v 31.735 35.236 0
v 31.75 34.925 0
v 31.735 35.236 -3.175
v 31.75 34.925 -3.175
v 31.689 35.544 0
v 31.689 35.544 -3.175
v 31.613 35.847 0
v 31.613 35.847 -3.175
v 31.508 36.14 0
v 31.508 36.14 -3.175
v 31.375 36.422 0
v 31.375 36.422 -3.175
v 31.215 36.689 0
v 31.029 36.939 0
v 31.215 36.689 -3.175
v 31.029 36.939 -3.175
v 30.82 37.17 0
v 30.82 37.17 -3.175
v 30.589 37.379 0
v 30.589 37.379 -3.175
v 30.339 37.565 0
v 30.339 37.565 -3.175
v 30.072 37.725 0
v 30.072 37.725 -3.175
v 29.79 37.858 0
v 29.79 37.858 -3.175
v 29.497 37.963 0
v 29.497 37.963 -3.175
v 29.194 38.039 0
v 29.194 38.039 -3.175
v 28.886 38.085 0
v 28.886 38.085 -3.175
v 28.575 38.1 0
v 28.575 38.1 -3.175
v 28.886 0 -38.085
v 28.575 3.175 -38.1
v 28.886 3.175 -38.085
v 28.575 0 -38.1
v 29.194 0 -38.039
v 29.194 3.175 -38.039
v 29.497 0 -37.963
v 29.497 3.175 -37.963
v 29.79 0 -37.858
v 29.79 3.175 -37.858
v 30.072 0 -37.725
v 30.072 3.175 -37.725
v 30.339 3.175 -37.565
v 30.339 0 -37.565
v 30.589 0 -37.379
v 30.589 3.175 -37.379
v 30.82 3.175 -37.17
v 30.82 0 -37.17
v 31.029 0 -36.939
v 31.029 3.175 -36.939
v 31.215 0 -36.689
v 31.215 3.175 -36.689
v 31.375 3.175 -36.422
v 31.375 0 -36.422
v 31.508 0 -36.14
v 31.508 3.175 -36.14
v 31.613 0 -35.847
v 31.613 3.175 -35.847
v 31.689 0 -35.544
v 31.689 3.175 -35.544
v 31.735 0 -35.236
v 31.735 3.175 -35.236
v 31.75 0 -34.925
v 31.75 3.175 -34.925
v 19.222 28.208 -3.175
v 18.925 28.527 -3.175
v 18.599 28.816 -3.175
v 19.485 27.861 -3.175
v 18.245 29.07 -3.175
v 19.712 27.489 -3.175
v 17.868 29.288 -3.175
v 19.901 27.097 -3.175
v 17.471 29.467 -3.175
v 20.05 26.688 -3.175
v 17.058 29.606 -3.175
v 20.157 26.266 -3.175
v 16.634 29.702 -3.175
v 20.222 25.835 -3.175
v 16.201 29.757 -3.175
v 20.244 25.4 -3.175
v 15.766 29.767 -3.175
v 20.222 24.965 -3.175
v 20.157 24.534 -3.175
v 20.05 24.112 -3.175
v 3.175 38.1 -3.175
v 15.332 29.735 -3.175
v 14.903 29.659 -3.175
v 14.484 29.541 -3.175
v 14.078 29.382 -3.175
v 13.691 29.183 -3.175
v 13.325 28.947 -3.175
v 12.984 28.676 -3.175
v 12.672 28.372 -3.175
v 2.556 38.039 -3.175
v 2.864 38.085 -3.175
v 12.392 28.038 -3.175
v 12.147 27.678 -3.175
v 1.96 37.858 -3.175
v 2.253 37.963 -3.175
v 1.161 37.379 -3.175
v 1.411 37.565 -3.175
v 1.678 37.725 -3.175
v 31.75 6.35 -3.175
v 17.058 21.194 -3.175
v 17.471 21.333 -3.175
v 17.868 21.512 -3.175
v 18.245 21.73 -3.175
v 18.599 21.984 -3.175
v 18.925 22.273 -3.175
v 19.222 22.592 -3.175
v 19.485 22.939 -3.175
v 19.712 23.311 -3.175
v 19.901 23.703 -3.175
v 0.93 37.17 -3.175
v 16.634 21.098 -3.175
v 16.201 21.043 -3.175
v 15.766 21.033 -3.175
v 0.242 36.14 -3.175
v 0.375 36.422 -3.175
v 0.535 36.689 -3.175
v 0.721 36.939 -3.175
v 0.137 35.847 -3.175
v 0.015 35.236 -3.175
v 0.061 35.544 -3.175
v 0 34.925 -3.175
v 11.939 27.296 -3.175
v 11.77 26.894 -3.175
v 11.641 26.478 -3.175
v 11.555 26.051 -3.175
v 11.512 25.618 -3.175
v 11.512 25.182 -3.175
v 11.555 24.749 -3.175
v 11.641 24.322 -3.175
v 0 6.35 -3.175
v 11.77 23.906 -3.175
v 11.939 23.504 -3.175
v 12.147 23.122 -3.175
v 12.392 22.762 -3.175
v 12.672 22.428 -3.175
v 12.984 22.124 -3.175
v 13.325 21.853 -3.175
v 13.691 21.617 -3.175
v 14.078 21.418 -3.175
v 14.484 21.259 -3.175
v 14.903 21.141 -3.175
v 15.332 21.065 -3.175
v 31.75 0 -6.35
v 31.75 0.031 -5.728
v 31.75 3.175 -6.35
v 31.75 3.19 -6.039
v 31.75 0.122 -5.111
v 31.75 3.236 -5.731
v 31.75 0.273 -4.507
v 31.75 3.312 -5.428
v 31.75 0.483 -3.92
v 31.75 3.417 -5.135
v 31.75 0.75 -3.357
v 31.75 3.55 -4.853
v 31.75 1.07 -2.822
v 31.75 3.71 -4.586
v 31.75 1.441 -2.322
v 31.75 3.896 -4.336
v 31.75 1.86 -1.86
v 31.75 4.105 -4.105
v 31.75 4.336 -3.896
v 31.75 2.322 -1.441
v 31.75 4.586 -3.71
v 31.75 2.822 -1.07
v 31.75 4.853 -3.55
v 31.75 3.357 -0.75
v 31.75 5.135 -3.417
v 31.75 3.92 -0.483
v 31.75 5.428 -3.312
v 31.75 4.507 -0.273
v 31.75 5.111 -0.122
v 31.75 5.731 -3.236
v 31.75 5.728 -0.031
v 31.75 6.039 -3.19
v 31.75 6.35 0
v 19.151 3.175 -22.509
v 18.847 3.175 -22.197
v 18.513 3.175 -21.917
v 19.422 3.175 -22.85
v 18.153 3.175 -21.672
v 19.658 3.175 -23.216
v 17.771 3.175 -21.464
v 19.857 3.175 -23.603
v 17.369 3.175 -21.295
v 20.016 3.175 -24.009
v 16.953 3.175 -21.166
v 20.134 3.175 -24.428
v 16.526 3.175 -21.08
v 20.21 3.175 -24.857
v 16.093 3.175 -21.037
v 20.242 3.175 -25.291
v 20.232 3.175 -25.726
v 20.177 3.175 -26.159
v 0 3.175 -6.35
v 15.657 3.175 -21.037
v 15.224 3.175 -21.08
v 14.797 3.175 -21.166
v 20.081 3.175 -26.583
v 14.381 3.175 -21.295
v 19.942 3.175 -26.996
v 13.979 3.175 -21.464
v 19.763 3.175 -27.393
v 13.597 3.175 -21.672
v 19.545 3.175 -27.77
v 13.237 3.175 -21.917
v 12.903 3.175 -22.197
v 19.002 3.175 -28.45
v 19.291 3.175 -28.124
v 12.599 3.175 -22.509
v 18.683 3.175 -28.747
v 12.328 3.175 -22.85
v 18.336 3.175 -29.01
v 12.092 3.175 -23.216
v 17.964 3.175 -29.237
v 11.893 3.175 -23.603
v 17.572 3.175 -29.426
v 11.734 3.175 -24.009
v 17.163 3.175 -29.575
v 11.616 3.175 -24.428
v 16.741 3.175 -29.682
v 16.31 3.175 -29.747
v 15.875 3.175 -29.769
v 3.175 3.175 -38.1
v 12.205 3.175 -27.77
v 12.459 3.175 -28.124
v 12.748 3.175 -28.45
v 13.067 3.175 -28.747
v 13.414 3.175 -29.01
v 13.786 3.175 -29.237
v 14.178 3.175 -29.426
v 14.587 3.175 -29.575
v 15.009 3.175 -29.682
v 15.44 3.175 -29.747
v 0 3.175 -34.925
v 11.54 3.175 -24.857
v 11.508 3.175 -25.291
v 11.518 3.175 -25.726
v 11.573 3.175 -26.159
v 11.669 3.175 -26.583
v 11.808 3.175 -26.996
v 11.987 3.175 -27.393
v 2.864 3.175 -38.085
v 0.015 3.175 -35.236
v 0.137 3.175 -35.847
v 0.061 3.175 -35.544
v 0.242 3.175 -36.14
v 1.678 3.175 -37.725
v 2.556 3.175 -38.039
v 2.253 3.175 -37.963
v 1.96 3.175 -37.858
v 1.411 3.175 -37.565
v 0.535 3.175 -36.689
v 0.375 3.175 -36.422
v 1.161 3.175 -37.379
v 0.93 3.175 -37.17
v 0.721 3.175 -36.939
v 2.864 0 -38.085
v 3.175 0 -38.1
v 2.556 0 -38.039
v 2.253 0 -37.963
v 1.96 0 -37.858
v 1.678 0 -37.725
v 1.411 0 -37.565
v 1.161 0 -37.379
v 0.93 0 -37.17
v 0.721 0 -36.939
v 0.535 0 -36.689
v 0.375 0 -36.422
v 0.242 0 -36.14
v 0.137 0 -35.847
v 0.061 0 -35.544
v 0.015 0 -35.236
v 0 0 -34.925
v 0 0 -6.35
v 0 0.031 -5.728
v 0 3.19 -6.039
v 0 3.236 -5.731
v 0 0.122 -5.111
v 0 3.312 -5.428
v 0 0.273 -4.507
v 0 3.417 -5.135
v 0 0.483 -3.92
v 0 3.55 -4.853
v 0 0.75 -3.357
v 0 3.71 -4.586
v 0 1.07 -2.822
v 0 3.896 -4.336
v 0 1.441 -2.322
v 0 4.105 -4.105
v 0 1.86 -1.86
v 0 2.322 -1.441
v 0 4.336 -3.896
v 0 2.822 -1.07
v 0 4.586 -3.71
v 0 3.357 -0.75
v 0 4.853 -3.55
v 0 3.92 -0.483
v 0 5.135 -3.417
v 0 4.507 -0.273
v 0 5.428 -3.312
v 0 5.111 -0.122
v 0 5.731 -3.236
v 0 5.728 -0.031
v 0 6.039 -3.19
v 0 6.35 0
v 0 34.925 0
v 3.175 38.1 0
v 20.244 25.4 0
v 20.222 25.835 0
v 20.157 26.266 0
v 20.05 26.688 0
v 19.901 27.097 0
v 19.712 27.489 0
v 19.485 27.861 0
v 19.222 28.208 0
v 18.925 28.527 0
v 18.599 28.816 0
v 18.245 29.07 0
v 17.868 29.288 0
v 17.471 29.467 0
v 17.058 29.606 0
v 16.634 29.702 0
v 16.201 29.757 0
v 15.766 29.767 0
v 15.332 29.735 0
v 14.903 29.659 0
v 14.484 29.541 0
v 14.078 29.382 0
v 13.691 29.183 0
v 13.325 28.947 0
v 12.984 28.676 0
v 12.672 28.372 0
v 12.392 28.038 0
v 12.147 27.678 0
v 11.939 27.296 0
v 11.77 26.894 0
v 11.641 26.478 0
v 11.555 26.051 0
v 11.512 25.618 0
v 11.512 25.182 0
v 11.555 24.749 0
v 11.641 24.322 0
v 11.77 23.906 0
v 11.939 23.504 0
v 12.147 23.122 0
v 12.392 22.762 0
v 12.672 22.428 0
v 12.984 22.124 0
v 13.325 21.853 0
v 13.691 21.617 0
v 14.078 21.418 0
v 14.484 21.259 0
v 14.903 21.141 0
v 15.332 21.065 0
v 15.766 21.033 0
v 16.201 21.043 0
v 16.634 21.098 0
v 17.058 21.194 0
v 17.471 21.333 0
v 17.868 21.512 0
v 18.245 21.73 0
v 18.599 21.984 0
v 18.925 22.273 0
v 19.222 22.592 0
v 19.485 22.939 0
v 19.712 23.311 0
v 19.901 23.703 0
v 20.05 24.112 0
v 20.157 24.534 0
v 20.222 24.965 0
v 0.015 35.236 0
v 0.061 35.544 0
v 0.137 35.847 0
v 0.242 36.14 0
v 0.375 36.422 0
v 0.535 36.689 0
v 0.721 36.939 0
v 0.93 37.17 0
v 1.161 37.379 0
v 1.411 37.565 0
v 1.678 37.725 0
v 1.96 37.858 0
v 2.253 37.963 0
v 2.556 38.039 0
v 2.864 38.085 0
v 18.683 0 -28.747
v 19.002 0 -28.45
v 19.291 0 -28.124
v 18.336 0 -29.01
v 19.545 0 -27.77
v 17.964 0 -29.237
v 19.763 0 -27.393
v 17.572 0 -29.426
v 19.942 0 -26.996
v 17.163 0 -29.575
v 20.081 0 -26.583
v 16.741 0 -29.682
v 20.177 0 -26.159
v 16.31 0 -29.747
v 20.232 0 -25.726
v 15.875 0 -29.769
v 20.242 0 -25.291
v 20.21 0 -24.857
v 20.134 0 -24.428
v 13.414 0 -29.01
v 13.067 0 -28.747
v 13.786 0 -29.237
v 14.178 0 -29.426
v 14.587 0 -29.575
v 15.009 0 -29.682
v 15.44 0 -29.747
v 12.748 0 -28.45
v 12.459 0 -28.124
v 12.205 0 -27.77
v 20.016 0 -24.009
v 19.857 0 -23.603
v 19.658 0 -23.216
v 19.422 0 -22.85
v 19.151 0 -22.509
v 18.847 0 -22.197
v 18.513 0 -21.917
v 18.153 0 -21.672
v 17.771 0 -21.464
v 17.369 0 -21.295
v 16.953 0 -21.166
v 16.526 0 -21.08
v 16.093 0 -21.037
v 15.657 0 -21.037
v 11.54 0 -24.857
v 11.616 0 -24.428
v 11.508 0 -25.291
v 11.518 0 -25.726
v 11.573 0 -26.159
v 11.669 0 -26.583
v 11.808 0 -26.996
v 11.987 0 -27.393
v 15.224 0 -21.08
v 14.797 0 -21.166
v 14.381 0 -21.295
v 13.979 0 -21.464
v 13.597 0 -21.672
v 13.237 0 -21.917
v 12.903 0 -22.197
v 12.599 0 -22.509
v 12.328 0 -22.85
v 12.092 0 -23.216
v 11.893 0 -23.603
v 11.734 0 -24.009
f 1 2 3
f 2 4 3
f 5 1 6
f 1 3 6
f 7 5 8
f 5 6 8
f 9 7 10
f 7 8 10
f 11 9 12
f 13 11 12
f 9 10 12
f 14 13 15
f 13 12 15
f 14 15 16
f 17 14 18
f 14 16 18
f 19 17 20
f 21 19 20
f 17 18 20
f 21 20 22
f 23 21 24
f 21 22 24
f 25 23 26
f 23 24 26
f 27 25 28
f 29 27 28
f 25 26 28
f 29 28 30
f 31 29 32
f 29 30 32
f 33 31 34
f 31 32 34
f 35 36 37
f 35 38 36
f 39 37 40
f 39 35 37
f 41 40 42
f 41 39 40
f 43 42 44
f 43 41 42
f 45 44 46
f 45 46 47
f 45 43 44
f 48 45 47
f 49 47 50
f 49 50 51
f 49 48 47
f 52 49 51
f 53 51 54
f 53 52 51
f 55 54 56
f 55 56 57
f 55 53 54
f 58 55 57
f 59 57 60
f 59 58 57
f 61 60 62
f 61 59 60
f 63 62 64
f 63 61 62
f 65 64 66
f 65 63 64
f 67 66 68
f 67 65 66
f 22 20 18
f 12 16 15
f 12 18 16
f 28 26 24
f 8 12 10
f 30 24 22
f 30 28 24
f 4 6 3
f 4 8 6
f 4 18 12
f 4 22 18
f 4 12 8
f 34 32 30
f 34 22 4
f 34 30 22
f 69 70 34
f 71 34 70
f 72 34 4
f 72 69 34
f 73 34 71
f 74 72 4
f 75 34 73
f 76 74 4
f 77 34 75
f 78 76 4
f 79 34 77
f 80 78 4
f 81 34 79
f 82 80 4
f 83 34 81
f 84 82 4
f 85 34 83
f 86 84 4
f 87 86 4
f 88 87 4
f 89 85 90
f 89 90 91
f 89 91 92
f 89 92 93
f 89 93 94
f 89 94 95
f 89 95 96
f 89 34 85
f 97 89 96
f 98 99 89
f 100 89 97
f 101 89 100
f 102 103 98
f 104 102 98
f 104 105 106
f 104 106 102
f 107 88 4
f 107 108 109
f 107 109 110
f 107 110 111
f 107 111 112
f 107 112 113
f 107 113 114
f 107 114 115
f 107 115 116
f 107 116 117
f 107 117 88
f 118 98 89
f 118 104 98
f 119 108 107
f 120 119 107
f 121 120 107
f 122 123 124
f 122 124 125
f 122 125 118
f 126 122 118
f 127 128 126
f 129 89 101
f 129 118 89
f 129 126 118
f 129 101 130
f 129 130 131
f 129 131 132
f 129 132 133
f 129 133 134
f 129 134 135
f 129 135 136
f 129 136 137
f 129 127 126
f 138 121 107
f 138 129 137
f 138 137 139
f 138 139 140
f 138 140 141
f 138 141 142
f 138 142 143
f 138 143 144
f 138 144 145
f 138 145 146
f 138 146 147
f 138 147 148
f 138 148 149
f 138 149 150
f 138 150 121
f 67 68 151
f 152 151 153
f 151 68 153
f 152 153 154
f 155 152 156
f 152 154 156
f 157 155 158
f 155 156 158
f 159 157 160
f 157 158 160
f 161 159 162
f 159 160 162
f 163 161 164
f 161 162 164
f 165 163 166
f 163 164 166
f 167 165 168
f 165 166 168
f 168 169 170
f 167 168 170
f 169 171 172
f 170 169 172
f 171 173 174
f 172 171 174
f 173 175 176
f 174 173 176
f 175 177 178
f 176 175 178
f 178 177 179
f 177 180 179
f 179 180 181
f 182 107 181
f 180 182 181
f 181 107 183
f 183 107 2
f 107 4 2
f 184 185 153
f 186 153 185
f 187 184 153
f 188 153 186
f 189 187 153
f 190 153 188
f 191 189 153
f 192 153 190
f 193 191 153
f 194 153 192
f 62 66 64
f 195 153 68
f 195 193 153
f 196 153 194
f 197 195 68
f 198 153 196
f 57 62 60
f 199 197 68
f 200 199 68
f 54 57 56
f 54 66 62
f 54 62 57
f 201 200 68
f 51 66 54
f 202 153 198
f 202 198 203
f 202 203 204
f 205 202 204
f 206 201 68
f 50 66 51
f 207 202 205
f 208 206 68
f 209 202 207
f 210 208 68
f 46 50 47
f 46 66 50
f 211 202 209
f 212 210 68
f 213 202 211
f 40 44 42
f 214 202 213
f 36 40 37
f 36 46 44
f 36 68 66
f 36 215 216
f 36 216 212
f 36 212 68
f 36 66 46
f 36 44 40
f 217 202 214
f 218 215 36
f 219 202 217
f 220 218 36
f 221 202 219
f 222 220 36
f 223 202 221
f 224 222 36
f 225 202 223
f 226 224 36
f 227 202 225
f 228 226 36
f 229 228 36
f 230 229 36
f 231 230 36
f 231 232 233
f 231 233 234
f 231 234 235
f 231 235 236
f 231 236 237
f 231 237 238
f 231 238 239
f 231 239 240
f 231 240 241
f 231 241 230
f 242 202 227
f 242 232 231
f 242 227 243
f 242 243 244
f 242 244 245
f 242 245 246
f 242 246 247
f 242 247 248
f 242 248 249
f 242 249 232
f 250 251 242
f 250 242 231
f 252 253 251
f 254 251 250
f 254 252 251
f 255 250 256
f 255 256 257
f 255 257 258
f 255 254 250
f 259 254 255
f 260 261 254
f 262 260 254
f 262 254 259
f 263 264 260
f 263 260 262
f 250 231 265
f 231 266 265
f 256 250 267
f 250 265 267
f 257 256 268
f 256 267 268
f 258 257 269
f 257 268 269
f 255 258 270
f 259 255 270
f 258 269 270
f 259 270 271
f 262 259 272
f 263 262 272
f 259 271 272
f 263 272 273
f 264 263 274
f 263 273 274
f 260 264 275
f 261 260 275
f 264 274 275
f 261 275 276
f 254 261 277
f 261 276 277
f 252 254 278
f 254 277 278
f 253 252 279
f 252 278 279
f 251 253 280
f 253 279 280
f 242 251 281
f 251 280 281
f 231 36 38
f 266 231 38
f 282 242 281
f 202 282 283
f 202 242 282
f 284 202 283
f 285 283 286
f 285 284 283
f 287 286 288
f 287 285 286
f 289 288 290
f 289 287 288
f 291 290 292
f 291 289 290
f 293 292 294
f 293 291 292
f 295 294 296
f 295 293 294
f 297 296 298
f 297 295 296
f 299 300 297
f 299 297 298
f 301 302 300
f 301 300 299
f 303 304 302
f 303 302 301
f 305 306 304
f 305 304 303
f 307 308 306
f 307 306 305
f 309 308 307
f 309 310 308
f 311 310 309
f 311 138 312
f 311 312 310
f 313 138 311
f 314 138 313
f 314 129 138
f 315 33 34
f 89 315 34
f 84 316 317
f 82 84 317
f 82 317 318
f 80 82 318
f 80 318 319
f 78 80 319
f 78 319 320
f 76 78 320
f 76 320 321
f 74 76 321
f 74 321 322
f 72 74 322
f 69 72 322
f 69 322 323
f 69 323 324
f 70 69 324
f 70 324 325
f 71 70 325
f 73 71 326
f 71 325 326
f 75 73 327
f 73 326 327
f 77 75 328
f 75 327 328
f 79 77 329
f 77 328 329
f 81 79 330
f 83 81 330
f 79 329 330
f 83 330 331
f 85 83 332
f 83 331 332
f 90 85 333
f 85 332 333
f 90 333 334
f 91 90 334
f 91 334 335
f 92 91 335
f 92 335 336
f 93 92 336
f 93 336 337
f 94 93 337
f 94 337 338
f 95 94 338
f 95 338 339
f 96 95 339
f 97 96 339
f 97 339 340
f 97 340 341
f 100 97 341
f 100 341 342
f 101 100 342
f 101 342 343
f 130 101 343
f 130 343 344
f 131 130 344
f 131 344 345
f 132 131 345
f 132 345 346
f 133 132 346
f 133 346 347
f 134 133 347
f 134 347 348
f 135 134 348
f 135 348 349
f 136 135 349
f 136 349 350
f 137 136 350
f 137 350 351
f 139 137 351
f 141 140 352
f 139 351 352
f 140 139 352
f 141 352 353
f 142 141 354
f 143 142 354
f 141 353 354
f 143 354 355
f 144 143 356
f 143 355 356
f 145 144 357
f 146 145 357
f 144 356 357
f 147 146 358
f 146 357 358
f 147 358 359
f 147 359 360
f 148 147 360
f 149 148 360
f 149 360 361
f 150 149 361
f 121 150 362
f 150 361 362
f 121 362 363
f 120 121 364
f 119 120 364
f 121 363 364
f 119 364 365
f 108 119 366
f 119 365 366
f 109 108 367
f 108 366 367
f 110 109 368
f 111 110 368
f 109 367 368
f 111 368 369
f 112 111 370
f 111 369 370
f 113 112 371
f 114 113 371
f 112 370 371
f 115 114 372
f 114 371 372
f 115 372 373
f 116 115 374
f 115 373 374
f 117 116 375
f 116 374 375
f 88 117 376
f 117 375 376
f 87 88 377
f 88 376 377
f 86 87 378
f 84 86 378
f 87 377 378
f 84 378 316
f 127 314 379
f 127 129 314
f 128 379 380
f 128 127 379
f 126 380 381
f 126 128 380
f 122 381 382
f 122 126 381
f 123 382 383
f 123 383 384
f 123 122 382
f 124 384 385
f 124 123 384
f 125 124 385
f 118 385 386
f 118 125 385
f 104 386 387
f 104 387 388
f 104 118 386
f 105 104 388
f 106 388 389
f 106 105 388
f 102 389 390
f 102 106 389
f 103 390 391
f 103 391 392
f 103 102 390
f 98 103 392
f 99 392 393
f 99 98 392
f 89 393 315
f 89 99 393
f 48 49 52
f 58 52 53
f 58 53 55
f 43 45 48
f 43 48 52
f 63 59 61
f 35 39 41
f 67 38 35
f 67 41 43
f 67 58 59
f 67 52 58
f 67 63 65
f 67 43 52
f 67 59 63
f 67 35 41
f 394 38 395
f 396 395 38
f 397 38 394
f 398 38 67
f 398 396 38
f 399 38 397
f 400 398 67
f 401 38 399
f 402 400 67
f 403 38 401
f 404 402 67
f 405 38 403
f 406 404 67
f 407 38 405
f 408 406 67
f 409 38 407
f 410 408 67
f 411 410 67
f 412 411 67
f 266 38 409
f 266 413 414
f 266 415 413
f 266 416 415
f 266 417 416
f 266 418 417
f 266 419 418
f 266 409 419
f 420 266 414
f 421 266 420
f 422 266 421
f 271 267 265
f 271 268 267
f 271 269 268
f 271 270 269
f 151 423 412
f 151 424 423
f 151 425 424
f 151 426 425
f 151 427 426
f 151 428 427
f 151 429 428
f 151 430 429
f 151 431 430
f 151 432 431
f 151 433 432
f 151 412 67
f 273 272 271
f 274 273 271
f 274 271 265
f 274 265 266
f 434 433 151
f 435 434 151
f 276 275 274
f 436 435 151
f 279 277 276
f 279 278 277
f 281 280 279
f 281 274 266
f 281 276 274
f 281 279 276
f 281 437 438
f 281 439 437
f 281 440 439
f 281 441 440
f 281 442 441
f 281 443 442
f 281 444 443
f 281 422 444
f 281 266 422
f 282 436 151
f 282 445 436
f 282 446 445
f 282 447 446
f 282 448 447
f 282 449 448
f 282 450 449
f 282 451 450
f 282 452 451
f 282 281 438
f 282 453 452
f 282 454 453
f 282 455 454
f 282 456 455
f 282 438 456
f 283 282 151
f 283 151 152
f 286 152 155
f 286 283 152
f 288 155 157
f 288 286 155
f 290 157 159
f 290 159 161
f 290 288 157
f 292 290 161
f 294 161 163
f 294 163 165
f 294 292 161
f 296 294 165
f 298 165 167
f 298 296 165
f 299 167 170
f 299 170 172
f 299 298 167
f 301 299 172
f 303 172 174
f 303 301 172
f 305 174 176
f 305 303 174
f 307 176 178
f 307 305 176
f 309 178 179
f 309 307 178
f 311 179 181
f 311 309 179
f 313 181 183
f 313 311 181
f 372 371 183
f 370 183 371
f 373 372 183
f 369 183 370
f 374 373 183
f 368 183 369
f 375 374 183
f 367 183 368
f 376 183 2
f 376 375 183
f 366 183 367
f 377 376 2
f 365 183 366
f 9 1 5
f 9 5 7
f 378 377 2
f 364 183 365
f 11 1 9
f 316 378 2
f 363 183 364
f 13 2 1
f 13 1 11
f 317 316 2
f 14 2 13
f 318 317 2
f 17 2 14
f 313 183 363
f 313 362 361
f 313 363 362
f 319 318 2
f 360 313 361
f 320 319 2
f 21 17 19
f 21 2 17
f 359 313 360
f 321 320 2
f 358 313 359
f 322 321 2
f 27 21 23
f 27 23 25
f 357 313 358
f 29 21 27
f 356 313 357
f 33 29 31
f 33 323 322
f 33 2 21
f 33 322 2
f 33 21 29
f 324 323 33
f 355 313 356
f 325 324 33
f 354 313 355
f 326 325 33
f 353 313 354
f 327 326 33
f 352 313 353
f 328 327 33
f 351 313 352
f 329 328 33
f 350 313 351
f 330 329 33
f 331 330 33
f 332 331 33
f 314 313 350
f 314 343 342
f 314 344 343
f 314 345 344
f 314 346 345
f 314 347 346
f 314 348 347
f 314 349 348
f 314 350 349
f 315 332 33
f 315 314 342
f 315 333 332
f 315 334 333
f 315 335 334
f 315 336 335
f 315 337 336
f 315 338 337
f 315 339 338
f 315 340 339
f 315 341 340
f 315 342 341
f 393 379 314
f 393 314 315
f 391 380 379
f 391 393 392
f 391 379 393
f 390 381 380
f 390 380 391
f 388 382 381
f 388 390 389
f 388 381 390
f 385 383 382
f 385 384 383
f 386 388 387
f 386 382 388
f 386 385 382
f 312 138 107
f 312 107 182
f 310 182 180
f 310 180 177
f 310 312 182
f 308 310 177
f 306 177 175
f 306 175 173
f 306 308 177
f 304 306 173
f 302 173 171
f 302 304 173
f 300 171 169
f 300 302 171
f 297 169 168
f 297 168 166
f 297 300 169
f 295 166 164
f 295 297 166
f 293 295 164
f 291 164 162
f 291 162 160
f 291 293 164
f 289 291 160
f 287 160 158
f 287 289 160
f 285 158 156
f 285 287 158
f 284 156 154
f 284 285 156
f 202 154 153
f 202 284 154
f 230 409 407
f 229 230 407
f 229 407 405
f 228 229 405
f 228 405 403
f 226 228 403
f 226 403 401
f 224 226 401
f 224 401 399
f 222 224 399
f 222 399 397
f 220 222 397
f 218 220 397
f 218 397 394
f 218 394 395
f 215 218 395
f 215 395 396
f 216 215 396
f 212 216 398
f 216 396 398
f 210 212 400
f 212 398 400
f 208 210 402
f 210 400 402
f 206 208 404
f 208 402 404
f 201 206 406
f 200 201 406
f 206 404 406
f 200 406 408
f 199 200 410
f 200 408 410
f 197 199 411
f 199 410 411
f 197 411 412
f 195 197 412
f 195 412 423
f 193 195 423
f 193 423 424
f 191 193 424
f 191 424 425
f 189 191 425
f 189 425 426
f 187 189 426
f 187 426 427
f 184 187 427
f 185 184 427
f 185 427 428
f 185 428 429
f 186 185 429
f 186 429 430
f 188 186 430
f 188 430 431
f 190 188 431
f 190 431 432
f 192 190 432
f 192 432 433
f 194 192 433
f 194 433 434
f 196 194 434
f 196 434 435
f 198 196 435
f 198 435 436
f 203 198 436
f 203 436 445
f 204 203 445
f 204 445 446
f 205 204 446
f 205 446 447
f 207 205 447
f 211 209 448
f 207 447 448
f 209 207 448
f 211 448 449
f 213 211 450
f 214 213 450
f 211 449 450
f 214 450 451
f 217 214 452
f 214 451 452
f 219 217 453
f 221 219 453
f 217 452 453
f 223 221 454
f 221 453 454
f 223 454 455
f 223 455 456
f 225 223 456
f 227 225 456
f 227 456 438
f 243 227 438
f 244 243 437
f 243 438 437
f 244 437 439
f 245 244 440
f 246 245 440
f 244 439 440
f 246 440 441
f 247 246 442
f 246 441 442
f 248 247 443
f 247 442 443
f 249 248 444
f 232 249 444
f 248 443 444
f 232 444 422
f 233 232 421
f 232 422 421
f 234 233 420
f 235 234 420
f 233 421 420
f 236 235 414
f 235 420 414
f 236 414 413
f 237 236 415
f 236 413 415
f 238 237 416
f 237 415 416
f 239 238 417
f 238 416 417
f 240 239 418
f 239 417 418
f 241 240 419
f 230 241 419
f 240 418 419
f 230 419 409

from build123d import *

# Parameters (mm, degrees)
BASE_FLANGE1_DEPTH = 31.75
SKETCH6_R          = 4.3688
CUT_EXTRUDE1_DEPTH = 63.540247041
SKETCH7_R          = 4.3688
CUT_EXTRUDE2_DEPTH = 63.540247041
FILLET1_R          = 3.175


# Sheet-metal steps are written as plain solids
with BuildPart() as part:
    # Sketch1 → Base-Flange1 (new body)
    with BuildSketch(Plane(origin=(0, 0, 0), x_dir=(0, 0, -1), z_dir=(1, 0, 0))):
        with BuildLine():
            Line((38.1, 0), (6.35, 0))
            ThreePointArc((6.35, 0), (1.859871939, 1.859871939), (0, 6.35))
            Line((0, 6.35), (0, 38.1))
            Line((0, 38.1), (3.175, 38.1))
            Line((3.175, 38.1), (3.175, 6.35))
            ThreePointArc((3.175, 6.35), (4.10493597, 4.10493597), (6.35, 3.175))
            Line((6.35, 3.175), (38.1, 3.175))
            Line((38.1, 3.175), (38.1, 0))
        make_face()
    extrude(amount=BASE_FLANGE1_DEPTH)

    # Sketch6 → Cut-Extrude1 (cut, through all)
    with BuildSketch(Plane.XY):
        with Locations((15.875, 25.4)):
            Circle(SKETCH6_R)
    extrude(amount=-CUT_EXTRUDE1_DEPTH, mode=Mode.SUBTRACT)

    # Sketch7 → Cut-Extrude2 (cut, through all)
    with BuildSketch(Plane.XZ):
        with Locations(Location((15.875, -25.4, 0), (0, 0, 270))):
            Circle(SKETCH7_R)
    extrude(amount=-CUT_EXTRUDE2_DEPTH, mode=Mode.SUBTRACT)

    # Fillet1
    fillet1_edges = [part.edges().sort_by_distance(p)[0] for p in [
        (31.75, 38.1, -1.5875),
        (0, 38.1, -1.5875),
        (31.75, 1.5875, -38.1),
        (0, 1.5875, -38.1),
    ]]
    fillet(fillet1_edges, radius=FILLET1_R)


solid = part.part
